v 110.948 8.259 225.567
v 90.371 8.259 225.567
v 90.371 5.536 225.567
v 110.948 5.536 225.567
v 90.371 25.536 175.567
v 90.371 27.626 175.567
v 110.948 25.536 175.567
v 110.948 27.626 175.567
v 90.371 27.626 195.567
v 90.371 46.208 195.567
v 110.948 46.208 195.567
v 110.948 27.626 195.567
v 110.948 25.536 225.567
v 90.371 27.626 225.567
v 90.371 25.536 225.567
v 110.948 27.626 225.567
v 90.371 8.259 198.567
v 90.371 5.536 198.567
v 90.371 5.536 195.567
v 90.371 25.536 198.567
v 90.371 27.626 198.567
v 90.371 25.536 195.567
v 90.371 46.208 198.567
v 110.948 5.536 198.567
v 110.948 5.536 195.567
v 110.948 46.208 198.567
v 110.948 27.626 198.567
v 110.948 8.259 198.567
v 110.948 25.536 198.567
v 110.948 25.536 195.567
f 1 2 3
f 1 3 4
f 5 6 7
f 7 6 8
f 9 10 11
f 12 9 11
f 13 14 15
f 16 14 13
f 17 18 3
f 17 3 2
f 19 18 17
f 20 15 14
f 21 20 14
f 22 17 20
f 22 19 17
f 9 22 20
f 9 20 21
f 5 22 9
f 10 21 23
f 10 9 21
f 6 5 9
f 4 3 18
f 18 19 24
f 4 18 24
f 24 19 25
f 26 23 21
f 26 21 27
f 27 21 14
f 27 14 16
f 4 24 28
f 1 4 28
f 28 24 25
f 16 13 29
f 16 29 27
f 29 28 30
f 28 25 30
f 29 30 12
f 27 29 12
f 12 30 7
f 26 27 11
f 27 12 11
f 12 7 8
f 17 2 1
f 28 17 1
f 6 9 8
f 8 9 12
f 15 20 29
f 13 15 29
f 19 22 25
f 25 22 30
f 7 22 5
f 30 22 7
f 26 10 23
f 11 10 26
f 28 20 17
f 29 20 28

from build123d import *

# Parameters (mm, degrees)
SKETCH1_W                = 20.576303651
SKETCH1_H                = 2.09043177
BOSS_EXTRUDE1_DEPTH      = 30
BOSS_EXTRUDE1_DEPTH_BACK = 20
SKETCH2_W                = 20.576303651
SKETCH2_H                = 18.581877963
BOSS_EXTRUDE2_DEPTH      = 3
SKETCH3_W                = 20.576303651
SKETCH3_H                = 3
BOSS_EXTRUDE3_DEPTH      = 20
SKETCH4_W                = 20.576303651
SKETCH4_H                = 2.723460459
BOSS_EXTRUDE4_DEPTH      = 27


with BuildPart() as part:
    # Sketch1 → Boss-Extrude1 (new body, two sides)
    with BuildSketch(Plane.XY.offset(195.567247699)) as boss_extrude1_sk:
        with Locations((100.659362947, 26.580882383)):
            Rectangle(SKETCH1_W, SKETCH1_H)
    extrude(amount=BOSS_EXTRUDE1_DEPTH)
    extrude(boss_extrude1_sk.sketch, amount=-BOSS_EXTRUDE1_DEPTH_BACK)

    # Sketch2 → Boss-Extrude2 (add)
    with BuildSketch(Plane.XY.offset(195.567247699)):
        with Locations((100.659362947, 36.91703725)):
            Rectangle(SKETCH2_W, SKETCH2_H)
    extrude(amount=BOSS_EXTRUDE2_DEPTH)

    # Sketch3 → Boss-Extrude3 (add)
    with BuildSketch(Plane.XZ.offset(-25.535666498)):
        with Locations((100.659362947, 197.067247699)):
            Rectangle(SKETCH3_W, SKETCH3_H)
    extrude(amount=BOSS_EXTRUDE3_DEPTH)

    # Sketch4 → Boss-Extrude4 (add)
    with BuildSketch(Plane.XY.offset(198.567247699)):
        with Locations((100.659362947, 6.897396728)):
            Rectangle(SKETCH4_W, SKETCH4_H)
    extrude(amount=BOSS_EXTRUDE4_DEPTH)


solid = part.part
